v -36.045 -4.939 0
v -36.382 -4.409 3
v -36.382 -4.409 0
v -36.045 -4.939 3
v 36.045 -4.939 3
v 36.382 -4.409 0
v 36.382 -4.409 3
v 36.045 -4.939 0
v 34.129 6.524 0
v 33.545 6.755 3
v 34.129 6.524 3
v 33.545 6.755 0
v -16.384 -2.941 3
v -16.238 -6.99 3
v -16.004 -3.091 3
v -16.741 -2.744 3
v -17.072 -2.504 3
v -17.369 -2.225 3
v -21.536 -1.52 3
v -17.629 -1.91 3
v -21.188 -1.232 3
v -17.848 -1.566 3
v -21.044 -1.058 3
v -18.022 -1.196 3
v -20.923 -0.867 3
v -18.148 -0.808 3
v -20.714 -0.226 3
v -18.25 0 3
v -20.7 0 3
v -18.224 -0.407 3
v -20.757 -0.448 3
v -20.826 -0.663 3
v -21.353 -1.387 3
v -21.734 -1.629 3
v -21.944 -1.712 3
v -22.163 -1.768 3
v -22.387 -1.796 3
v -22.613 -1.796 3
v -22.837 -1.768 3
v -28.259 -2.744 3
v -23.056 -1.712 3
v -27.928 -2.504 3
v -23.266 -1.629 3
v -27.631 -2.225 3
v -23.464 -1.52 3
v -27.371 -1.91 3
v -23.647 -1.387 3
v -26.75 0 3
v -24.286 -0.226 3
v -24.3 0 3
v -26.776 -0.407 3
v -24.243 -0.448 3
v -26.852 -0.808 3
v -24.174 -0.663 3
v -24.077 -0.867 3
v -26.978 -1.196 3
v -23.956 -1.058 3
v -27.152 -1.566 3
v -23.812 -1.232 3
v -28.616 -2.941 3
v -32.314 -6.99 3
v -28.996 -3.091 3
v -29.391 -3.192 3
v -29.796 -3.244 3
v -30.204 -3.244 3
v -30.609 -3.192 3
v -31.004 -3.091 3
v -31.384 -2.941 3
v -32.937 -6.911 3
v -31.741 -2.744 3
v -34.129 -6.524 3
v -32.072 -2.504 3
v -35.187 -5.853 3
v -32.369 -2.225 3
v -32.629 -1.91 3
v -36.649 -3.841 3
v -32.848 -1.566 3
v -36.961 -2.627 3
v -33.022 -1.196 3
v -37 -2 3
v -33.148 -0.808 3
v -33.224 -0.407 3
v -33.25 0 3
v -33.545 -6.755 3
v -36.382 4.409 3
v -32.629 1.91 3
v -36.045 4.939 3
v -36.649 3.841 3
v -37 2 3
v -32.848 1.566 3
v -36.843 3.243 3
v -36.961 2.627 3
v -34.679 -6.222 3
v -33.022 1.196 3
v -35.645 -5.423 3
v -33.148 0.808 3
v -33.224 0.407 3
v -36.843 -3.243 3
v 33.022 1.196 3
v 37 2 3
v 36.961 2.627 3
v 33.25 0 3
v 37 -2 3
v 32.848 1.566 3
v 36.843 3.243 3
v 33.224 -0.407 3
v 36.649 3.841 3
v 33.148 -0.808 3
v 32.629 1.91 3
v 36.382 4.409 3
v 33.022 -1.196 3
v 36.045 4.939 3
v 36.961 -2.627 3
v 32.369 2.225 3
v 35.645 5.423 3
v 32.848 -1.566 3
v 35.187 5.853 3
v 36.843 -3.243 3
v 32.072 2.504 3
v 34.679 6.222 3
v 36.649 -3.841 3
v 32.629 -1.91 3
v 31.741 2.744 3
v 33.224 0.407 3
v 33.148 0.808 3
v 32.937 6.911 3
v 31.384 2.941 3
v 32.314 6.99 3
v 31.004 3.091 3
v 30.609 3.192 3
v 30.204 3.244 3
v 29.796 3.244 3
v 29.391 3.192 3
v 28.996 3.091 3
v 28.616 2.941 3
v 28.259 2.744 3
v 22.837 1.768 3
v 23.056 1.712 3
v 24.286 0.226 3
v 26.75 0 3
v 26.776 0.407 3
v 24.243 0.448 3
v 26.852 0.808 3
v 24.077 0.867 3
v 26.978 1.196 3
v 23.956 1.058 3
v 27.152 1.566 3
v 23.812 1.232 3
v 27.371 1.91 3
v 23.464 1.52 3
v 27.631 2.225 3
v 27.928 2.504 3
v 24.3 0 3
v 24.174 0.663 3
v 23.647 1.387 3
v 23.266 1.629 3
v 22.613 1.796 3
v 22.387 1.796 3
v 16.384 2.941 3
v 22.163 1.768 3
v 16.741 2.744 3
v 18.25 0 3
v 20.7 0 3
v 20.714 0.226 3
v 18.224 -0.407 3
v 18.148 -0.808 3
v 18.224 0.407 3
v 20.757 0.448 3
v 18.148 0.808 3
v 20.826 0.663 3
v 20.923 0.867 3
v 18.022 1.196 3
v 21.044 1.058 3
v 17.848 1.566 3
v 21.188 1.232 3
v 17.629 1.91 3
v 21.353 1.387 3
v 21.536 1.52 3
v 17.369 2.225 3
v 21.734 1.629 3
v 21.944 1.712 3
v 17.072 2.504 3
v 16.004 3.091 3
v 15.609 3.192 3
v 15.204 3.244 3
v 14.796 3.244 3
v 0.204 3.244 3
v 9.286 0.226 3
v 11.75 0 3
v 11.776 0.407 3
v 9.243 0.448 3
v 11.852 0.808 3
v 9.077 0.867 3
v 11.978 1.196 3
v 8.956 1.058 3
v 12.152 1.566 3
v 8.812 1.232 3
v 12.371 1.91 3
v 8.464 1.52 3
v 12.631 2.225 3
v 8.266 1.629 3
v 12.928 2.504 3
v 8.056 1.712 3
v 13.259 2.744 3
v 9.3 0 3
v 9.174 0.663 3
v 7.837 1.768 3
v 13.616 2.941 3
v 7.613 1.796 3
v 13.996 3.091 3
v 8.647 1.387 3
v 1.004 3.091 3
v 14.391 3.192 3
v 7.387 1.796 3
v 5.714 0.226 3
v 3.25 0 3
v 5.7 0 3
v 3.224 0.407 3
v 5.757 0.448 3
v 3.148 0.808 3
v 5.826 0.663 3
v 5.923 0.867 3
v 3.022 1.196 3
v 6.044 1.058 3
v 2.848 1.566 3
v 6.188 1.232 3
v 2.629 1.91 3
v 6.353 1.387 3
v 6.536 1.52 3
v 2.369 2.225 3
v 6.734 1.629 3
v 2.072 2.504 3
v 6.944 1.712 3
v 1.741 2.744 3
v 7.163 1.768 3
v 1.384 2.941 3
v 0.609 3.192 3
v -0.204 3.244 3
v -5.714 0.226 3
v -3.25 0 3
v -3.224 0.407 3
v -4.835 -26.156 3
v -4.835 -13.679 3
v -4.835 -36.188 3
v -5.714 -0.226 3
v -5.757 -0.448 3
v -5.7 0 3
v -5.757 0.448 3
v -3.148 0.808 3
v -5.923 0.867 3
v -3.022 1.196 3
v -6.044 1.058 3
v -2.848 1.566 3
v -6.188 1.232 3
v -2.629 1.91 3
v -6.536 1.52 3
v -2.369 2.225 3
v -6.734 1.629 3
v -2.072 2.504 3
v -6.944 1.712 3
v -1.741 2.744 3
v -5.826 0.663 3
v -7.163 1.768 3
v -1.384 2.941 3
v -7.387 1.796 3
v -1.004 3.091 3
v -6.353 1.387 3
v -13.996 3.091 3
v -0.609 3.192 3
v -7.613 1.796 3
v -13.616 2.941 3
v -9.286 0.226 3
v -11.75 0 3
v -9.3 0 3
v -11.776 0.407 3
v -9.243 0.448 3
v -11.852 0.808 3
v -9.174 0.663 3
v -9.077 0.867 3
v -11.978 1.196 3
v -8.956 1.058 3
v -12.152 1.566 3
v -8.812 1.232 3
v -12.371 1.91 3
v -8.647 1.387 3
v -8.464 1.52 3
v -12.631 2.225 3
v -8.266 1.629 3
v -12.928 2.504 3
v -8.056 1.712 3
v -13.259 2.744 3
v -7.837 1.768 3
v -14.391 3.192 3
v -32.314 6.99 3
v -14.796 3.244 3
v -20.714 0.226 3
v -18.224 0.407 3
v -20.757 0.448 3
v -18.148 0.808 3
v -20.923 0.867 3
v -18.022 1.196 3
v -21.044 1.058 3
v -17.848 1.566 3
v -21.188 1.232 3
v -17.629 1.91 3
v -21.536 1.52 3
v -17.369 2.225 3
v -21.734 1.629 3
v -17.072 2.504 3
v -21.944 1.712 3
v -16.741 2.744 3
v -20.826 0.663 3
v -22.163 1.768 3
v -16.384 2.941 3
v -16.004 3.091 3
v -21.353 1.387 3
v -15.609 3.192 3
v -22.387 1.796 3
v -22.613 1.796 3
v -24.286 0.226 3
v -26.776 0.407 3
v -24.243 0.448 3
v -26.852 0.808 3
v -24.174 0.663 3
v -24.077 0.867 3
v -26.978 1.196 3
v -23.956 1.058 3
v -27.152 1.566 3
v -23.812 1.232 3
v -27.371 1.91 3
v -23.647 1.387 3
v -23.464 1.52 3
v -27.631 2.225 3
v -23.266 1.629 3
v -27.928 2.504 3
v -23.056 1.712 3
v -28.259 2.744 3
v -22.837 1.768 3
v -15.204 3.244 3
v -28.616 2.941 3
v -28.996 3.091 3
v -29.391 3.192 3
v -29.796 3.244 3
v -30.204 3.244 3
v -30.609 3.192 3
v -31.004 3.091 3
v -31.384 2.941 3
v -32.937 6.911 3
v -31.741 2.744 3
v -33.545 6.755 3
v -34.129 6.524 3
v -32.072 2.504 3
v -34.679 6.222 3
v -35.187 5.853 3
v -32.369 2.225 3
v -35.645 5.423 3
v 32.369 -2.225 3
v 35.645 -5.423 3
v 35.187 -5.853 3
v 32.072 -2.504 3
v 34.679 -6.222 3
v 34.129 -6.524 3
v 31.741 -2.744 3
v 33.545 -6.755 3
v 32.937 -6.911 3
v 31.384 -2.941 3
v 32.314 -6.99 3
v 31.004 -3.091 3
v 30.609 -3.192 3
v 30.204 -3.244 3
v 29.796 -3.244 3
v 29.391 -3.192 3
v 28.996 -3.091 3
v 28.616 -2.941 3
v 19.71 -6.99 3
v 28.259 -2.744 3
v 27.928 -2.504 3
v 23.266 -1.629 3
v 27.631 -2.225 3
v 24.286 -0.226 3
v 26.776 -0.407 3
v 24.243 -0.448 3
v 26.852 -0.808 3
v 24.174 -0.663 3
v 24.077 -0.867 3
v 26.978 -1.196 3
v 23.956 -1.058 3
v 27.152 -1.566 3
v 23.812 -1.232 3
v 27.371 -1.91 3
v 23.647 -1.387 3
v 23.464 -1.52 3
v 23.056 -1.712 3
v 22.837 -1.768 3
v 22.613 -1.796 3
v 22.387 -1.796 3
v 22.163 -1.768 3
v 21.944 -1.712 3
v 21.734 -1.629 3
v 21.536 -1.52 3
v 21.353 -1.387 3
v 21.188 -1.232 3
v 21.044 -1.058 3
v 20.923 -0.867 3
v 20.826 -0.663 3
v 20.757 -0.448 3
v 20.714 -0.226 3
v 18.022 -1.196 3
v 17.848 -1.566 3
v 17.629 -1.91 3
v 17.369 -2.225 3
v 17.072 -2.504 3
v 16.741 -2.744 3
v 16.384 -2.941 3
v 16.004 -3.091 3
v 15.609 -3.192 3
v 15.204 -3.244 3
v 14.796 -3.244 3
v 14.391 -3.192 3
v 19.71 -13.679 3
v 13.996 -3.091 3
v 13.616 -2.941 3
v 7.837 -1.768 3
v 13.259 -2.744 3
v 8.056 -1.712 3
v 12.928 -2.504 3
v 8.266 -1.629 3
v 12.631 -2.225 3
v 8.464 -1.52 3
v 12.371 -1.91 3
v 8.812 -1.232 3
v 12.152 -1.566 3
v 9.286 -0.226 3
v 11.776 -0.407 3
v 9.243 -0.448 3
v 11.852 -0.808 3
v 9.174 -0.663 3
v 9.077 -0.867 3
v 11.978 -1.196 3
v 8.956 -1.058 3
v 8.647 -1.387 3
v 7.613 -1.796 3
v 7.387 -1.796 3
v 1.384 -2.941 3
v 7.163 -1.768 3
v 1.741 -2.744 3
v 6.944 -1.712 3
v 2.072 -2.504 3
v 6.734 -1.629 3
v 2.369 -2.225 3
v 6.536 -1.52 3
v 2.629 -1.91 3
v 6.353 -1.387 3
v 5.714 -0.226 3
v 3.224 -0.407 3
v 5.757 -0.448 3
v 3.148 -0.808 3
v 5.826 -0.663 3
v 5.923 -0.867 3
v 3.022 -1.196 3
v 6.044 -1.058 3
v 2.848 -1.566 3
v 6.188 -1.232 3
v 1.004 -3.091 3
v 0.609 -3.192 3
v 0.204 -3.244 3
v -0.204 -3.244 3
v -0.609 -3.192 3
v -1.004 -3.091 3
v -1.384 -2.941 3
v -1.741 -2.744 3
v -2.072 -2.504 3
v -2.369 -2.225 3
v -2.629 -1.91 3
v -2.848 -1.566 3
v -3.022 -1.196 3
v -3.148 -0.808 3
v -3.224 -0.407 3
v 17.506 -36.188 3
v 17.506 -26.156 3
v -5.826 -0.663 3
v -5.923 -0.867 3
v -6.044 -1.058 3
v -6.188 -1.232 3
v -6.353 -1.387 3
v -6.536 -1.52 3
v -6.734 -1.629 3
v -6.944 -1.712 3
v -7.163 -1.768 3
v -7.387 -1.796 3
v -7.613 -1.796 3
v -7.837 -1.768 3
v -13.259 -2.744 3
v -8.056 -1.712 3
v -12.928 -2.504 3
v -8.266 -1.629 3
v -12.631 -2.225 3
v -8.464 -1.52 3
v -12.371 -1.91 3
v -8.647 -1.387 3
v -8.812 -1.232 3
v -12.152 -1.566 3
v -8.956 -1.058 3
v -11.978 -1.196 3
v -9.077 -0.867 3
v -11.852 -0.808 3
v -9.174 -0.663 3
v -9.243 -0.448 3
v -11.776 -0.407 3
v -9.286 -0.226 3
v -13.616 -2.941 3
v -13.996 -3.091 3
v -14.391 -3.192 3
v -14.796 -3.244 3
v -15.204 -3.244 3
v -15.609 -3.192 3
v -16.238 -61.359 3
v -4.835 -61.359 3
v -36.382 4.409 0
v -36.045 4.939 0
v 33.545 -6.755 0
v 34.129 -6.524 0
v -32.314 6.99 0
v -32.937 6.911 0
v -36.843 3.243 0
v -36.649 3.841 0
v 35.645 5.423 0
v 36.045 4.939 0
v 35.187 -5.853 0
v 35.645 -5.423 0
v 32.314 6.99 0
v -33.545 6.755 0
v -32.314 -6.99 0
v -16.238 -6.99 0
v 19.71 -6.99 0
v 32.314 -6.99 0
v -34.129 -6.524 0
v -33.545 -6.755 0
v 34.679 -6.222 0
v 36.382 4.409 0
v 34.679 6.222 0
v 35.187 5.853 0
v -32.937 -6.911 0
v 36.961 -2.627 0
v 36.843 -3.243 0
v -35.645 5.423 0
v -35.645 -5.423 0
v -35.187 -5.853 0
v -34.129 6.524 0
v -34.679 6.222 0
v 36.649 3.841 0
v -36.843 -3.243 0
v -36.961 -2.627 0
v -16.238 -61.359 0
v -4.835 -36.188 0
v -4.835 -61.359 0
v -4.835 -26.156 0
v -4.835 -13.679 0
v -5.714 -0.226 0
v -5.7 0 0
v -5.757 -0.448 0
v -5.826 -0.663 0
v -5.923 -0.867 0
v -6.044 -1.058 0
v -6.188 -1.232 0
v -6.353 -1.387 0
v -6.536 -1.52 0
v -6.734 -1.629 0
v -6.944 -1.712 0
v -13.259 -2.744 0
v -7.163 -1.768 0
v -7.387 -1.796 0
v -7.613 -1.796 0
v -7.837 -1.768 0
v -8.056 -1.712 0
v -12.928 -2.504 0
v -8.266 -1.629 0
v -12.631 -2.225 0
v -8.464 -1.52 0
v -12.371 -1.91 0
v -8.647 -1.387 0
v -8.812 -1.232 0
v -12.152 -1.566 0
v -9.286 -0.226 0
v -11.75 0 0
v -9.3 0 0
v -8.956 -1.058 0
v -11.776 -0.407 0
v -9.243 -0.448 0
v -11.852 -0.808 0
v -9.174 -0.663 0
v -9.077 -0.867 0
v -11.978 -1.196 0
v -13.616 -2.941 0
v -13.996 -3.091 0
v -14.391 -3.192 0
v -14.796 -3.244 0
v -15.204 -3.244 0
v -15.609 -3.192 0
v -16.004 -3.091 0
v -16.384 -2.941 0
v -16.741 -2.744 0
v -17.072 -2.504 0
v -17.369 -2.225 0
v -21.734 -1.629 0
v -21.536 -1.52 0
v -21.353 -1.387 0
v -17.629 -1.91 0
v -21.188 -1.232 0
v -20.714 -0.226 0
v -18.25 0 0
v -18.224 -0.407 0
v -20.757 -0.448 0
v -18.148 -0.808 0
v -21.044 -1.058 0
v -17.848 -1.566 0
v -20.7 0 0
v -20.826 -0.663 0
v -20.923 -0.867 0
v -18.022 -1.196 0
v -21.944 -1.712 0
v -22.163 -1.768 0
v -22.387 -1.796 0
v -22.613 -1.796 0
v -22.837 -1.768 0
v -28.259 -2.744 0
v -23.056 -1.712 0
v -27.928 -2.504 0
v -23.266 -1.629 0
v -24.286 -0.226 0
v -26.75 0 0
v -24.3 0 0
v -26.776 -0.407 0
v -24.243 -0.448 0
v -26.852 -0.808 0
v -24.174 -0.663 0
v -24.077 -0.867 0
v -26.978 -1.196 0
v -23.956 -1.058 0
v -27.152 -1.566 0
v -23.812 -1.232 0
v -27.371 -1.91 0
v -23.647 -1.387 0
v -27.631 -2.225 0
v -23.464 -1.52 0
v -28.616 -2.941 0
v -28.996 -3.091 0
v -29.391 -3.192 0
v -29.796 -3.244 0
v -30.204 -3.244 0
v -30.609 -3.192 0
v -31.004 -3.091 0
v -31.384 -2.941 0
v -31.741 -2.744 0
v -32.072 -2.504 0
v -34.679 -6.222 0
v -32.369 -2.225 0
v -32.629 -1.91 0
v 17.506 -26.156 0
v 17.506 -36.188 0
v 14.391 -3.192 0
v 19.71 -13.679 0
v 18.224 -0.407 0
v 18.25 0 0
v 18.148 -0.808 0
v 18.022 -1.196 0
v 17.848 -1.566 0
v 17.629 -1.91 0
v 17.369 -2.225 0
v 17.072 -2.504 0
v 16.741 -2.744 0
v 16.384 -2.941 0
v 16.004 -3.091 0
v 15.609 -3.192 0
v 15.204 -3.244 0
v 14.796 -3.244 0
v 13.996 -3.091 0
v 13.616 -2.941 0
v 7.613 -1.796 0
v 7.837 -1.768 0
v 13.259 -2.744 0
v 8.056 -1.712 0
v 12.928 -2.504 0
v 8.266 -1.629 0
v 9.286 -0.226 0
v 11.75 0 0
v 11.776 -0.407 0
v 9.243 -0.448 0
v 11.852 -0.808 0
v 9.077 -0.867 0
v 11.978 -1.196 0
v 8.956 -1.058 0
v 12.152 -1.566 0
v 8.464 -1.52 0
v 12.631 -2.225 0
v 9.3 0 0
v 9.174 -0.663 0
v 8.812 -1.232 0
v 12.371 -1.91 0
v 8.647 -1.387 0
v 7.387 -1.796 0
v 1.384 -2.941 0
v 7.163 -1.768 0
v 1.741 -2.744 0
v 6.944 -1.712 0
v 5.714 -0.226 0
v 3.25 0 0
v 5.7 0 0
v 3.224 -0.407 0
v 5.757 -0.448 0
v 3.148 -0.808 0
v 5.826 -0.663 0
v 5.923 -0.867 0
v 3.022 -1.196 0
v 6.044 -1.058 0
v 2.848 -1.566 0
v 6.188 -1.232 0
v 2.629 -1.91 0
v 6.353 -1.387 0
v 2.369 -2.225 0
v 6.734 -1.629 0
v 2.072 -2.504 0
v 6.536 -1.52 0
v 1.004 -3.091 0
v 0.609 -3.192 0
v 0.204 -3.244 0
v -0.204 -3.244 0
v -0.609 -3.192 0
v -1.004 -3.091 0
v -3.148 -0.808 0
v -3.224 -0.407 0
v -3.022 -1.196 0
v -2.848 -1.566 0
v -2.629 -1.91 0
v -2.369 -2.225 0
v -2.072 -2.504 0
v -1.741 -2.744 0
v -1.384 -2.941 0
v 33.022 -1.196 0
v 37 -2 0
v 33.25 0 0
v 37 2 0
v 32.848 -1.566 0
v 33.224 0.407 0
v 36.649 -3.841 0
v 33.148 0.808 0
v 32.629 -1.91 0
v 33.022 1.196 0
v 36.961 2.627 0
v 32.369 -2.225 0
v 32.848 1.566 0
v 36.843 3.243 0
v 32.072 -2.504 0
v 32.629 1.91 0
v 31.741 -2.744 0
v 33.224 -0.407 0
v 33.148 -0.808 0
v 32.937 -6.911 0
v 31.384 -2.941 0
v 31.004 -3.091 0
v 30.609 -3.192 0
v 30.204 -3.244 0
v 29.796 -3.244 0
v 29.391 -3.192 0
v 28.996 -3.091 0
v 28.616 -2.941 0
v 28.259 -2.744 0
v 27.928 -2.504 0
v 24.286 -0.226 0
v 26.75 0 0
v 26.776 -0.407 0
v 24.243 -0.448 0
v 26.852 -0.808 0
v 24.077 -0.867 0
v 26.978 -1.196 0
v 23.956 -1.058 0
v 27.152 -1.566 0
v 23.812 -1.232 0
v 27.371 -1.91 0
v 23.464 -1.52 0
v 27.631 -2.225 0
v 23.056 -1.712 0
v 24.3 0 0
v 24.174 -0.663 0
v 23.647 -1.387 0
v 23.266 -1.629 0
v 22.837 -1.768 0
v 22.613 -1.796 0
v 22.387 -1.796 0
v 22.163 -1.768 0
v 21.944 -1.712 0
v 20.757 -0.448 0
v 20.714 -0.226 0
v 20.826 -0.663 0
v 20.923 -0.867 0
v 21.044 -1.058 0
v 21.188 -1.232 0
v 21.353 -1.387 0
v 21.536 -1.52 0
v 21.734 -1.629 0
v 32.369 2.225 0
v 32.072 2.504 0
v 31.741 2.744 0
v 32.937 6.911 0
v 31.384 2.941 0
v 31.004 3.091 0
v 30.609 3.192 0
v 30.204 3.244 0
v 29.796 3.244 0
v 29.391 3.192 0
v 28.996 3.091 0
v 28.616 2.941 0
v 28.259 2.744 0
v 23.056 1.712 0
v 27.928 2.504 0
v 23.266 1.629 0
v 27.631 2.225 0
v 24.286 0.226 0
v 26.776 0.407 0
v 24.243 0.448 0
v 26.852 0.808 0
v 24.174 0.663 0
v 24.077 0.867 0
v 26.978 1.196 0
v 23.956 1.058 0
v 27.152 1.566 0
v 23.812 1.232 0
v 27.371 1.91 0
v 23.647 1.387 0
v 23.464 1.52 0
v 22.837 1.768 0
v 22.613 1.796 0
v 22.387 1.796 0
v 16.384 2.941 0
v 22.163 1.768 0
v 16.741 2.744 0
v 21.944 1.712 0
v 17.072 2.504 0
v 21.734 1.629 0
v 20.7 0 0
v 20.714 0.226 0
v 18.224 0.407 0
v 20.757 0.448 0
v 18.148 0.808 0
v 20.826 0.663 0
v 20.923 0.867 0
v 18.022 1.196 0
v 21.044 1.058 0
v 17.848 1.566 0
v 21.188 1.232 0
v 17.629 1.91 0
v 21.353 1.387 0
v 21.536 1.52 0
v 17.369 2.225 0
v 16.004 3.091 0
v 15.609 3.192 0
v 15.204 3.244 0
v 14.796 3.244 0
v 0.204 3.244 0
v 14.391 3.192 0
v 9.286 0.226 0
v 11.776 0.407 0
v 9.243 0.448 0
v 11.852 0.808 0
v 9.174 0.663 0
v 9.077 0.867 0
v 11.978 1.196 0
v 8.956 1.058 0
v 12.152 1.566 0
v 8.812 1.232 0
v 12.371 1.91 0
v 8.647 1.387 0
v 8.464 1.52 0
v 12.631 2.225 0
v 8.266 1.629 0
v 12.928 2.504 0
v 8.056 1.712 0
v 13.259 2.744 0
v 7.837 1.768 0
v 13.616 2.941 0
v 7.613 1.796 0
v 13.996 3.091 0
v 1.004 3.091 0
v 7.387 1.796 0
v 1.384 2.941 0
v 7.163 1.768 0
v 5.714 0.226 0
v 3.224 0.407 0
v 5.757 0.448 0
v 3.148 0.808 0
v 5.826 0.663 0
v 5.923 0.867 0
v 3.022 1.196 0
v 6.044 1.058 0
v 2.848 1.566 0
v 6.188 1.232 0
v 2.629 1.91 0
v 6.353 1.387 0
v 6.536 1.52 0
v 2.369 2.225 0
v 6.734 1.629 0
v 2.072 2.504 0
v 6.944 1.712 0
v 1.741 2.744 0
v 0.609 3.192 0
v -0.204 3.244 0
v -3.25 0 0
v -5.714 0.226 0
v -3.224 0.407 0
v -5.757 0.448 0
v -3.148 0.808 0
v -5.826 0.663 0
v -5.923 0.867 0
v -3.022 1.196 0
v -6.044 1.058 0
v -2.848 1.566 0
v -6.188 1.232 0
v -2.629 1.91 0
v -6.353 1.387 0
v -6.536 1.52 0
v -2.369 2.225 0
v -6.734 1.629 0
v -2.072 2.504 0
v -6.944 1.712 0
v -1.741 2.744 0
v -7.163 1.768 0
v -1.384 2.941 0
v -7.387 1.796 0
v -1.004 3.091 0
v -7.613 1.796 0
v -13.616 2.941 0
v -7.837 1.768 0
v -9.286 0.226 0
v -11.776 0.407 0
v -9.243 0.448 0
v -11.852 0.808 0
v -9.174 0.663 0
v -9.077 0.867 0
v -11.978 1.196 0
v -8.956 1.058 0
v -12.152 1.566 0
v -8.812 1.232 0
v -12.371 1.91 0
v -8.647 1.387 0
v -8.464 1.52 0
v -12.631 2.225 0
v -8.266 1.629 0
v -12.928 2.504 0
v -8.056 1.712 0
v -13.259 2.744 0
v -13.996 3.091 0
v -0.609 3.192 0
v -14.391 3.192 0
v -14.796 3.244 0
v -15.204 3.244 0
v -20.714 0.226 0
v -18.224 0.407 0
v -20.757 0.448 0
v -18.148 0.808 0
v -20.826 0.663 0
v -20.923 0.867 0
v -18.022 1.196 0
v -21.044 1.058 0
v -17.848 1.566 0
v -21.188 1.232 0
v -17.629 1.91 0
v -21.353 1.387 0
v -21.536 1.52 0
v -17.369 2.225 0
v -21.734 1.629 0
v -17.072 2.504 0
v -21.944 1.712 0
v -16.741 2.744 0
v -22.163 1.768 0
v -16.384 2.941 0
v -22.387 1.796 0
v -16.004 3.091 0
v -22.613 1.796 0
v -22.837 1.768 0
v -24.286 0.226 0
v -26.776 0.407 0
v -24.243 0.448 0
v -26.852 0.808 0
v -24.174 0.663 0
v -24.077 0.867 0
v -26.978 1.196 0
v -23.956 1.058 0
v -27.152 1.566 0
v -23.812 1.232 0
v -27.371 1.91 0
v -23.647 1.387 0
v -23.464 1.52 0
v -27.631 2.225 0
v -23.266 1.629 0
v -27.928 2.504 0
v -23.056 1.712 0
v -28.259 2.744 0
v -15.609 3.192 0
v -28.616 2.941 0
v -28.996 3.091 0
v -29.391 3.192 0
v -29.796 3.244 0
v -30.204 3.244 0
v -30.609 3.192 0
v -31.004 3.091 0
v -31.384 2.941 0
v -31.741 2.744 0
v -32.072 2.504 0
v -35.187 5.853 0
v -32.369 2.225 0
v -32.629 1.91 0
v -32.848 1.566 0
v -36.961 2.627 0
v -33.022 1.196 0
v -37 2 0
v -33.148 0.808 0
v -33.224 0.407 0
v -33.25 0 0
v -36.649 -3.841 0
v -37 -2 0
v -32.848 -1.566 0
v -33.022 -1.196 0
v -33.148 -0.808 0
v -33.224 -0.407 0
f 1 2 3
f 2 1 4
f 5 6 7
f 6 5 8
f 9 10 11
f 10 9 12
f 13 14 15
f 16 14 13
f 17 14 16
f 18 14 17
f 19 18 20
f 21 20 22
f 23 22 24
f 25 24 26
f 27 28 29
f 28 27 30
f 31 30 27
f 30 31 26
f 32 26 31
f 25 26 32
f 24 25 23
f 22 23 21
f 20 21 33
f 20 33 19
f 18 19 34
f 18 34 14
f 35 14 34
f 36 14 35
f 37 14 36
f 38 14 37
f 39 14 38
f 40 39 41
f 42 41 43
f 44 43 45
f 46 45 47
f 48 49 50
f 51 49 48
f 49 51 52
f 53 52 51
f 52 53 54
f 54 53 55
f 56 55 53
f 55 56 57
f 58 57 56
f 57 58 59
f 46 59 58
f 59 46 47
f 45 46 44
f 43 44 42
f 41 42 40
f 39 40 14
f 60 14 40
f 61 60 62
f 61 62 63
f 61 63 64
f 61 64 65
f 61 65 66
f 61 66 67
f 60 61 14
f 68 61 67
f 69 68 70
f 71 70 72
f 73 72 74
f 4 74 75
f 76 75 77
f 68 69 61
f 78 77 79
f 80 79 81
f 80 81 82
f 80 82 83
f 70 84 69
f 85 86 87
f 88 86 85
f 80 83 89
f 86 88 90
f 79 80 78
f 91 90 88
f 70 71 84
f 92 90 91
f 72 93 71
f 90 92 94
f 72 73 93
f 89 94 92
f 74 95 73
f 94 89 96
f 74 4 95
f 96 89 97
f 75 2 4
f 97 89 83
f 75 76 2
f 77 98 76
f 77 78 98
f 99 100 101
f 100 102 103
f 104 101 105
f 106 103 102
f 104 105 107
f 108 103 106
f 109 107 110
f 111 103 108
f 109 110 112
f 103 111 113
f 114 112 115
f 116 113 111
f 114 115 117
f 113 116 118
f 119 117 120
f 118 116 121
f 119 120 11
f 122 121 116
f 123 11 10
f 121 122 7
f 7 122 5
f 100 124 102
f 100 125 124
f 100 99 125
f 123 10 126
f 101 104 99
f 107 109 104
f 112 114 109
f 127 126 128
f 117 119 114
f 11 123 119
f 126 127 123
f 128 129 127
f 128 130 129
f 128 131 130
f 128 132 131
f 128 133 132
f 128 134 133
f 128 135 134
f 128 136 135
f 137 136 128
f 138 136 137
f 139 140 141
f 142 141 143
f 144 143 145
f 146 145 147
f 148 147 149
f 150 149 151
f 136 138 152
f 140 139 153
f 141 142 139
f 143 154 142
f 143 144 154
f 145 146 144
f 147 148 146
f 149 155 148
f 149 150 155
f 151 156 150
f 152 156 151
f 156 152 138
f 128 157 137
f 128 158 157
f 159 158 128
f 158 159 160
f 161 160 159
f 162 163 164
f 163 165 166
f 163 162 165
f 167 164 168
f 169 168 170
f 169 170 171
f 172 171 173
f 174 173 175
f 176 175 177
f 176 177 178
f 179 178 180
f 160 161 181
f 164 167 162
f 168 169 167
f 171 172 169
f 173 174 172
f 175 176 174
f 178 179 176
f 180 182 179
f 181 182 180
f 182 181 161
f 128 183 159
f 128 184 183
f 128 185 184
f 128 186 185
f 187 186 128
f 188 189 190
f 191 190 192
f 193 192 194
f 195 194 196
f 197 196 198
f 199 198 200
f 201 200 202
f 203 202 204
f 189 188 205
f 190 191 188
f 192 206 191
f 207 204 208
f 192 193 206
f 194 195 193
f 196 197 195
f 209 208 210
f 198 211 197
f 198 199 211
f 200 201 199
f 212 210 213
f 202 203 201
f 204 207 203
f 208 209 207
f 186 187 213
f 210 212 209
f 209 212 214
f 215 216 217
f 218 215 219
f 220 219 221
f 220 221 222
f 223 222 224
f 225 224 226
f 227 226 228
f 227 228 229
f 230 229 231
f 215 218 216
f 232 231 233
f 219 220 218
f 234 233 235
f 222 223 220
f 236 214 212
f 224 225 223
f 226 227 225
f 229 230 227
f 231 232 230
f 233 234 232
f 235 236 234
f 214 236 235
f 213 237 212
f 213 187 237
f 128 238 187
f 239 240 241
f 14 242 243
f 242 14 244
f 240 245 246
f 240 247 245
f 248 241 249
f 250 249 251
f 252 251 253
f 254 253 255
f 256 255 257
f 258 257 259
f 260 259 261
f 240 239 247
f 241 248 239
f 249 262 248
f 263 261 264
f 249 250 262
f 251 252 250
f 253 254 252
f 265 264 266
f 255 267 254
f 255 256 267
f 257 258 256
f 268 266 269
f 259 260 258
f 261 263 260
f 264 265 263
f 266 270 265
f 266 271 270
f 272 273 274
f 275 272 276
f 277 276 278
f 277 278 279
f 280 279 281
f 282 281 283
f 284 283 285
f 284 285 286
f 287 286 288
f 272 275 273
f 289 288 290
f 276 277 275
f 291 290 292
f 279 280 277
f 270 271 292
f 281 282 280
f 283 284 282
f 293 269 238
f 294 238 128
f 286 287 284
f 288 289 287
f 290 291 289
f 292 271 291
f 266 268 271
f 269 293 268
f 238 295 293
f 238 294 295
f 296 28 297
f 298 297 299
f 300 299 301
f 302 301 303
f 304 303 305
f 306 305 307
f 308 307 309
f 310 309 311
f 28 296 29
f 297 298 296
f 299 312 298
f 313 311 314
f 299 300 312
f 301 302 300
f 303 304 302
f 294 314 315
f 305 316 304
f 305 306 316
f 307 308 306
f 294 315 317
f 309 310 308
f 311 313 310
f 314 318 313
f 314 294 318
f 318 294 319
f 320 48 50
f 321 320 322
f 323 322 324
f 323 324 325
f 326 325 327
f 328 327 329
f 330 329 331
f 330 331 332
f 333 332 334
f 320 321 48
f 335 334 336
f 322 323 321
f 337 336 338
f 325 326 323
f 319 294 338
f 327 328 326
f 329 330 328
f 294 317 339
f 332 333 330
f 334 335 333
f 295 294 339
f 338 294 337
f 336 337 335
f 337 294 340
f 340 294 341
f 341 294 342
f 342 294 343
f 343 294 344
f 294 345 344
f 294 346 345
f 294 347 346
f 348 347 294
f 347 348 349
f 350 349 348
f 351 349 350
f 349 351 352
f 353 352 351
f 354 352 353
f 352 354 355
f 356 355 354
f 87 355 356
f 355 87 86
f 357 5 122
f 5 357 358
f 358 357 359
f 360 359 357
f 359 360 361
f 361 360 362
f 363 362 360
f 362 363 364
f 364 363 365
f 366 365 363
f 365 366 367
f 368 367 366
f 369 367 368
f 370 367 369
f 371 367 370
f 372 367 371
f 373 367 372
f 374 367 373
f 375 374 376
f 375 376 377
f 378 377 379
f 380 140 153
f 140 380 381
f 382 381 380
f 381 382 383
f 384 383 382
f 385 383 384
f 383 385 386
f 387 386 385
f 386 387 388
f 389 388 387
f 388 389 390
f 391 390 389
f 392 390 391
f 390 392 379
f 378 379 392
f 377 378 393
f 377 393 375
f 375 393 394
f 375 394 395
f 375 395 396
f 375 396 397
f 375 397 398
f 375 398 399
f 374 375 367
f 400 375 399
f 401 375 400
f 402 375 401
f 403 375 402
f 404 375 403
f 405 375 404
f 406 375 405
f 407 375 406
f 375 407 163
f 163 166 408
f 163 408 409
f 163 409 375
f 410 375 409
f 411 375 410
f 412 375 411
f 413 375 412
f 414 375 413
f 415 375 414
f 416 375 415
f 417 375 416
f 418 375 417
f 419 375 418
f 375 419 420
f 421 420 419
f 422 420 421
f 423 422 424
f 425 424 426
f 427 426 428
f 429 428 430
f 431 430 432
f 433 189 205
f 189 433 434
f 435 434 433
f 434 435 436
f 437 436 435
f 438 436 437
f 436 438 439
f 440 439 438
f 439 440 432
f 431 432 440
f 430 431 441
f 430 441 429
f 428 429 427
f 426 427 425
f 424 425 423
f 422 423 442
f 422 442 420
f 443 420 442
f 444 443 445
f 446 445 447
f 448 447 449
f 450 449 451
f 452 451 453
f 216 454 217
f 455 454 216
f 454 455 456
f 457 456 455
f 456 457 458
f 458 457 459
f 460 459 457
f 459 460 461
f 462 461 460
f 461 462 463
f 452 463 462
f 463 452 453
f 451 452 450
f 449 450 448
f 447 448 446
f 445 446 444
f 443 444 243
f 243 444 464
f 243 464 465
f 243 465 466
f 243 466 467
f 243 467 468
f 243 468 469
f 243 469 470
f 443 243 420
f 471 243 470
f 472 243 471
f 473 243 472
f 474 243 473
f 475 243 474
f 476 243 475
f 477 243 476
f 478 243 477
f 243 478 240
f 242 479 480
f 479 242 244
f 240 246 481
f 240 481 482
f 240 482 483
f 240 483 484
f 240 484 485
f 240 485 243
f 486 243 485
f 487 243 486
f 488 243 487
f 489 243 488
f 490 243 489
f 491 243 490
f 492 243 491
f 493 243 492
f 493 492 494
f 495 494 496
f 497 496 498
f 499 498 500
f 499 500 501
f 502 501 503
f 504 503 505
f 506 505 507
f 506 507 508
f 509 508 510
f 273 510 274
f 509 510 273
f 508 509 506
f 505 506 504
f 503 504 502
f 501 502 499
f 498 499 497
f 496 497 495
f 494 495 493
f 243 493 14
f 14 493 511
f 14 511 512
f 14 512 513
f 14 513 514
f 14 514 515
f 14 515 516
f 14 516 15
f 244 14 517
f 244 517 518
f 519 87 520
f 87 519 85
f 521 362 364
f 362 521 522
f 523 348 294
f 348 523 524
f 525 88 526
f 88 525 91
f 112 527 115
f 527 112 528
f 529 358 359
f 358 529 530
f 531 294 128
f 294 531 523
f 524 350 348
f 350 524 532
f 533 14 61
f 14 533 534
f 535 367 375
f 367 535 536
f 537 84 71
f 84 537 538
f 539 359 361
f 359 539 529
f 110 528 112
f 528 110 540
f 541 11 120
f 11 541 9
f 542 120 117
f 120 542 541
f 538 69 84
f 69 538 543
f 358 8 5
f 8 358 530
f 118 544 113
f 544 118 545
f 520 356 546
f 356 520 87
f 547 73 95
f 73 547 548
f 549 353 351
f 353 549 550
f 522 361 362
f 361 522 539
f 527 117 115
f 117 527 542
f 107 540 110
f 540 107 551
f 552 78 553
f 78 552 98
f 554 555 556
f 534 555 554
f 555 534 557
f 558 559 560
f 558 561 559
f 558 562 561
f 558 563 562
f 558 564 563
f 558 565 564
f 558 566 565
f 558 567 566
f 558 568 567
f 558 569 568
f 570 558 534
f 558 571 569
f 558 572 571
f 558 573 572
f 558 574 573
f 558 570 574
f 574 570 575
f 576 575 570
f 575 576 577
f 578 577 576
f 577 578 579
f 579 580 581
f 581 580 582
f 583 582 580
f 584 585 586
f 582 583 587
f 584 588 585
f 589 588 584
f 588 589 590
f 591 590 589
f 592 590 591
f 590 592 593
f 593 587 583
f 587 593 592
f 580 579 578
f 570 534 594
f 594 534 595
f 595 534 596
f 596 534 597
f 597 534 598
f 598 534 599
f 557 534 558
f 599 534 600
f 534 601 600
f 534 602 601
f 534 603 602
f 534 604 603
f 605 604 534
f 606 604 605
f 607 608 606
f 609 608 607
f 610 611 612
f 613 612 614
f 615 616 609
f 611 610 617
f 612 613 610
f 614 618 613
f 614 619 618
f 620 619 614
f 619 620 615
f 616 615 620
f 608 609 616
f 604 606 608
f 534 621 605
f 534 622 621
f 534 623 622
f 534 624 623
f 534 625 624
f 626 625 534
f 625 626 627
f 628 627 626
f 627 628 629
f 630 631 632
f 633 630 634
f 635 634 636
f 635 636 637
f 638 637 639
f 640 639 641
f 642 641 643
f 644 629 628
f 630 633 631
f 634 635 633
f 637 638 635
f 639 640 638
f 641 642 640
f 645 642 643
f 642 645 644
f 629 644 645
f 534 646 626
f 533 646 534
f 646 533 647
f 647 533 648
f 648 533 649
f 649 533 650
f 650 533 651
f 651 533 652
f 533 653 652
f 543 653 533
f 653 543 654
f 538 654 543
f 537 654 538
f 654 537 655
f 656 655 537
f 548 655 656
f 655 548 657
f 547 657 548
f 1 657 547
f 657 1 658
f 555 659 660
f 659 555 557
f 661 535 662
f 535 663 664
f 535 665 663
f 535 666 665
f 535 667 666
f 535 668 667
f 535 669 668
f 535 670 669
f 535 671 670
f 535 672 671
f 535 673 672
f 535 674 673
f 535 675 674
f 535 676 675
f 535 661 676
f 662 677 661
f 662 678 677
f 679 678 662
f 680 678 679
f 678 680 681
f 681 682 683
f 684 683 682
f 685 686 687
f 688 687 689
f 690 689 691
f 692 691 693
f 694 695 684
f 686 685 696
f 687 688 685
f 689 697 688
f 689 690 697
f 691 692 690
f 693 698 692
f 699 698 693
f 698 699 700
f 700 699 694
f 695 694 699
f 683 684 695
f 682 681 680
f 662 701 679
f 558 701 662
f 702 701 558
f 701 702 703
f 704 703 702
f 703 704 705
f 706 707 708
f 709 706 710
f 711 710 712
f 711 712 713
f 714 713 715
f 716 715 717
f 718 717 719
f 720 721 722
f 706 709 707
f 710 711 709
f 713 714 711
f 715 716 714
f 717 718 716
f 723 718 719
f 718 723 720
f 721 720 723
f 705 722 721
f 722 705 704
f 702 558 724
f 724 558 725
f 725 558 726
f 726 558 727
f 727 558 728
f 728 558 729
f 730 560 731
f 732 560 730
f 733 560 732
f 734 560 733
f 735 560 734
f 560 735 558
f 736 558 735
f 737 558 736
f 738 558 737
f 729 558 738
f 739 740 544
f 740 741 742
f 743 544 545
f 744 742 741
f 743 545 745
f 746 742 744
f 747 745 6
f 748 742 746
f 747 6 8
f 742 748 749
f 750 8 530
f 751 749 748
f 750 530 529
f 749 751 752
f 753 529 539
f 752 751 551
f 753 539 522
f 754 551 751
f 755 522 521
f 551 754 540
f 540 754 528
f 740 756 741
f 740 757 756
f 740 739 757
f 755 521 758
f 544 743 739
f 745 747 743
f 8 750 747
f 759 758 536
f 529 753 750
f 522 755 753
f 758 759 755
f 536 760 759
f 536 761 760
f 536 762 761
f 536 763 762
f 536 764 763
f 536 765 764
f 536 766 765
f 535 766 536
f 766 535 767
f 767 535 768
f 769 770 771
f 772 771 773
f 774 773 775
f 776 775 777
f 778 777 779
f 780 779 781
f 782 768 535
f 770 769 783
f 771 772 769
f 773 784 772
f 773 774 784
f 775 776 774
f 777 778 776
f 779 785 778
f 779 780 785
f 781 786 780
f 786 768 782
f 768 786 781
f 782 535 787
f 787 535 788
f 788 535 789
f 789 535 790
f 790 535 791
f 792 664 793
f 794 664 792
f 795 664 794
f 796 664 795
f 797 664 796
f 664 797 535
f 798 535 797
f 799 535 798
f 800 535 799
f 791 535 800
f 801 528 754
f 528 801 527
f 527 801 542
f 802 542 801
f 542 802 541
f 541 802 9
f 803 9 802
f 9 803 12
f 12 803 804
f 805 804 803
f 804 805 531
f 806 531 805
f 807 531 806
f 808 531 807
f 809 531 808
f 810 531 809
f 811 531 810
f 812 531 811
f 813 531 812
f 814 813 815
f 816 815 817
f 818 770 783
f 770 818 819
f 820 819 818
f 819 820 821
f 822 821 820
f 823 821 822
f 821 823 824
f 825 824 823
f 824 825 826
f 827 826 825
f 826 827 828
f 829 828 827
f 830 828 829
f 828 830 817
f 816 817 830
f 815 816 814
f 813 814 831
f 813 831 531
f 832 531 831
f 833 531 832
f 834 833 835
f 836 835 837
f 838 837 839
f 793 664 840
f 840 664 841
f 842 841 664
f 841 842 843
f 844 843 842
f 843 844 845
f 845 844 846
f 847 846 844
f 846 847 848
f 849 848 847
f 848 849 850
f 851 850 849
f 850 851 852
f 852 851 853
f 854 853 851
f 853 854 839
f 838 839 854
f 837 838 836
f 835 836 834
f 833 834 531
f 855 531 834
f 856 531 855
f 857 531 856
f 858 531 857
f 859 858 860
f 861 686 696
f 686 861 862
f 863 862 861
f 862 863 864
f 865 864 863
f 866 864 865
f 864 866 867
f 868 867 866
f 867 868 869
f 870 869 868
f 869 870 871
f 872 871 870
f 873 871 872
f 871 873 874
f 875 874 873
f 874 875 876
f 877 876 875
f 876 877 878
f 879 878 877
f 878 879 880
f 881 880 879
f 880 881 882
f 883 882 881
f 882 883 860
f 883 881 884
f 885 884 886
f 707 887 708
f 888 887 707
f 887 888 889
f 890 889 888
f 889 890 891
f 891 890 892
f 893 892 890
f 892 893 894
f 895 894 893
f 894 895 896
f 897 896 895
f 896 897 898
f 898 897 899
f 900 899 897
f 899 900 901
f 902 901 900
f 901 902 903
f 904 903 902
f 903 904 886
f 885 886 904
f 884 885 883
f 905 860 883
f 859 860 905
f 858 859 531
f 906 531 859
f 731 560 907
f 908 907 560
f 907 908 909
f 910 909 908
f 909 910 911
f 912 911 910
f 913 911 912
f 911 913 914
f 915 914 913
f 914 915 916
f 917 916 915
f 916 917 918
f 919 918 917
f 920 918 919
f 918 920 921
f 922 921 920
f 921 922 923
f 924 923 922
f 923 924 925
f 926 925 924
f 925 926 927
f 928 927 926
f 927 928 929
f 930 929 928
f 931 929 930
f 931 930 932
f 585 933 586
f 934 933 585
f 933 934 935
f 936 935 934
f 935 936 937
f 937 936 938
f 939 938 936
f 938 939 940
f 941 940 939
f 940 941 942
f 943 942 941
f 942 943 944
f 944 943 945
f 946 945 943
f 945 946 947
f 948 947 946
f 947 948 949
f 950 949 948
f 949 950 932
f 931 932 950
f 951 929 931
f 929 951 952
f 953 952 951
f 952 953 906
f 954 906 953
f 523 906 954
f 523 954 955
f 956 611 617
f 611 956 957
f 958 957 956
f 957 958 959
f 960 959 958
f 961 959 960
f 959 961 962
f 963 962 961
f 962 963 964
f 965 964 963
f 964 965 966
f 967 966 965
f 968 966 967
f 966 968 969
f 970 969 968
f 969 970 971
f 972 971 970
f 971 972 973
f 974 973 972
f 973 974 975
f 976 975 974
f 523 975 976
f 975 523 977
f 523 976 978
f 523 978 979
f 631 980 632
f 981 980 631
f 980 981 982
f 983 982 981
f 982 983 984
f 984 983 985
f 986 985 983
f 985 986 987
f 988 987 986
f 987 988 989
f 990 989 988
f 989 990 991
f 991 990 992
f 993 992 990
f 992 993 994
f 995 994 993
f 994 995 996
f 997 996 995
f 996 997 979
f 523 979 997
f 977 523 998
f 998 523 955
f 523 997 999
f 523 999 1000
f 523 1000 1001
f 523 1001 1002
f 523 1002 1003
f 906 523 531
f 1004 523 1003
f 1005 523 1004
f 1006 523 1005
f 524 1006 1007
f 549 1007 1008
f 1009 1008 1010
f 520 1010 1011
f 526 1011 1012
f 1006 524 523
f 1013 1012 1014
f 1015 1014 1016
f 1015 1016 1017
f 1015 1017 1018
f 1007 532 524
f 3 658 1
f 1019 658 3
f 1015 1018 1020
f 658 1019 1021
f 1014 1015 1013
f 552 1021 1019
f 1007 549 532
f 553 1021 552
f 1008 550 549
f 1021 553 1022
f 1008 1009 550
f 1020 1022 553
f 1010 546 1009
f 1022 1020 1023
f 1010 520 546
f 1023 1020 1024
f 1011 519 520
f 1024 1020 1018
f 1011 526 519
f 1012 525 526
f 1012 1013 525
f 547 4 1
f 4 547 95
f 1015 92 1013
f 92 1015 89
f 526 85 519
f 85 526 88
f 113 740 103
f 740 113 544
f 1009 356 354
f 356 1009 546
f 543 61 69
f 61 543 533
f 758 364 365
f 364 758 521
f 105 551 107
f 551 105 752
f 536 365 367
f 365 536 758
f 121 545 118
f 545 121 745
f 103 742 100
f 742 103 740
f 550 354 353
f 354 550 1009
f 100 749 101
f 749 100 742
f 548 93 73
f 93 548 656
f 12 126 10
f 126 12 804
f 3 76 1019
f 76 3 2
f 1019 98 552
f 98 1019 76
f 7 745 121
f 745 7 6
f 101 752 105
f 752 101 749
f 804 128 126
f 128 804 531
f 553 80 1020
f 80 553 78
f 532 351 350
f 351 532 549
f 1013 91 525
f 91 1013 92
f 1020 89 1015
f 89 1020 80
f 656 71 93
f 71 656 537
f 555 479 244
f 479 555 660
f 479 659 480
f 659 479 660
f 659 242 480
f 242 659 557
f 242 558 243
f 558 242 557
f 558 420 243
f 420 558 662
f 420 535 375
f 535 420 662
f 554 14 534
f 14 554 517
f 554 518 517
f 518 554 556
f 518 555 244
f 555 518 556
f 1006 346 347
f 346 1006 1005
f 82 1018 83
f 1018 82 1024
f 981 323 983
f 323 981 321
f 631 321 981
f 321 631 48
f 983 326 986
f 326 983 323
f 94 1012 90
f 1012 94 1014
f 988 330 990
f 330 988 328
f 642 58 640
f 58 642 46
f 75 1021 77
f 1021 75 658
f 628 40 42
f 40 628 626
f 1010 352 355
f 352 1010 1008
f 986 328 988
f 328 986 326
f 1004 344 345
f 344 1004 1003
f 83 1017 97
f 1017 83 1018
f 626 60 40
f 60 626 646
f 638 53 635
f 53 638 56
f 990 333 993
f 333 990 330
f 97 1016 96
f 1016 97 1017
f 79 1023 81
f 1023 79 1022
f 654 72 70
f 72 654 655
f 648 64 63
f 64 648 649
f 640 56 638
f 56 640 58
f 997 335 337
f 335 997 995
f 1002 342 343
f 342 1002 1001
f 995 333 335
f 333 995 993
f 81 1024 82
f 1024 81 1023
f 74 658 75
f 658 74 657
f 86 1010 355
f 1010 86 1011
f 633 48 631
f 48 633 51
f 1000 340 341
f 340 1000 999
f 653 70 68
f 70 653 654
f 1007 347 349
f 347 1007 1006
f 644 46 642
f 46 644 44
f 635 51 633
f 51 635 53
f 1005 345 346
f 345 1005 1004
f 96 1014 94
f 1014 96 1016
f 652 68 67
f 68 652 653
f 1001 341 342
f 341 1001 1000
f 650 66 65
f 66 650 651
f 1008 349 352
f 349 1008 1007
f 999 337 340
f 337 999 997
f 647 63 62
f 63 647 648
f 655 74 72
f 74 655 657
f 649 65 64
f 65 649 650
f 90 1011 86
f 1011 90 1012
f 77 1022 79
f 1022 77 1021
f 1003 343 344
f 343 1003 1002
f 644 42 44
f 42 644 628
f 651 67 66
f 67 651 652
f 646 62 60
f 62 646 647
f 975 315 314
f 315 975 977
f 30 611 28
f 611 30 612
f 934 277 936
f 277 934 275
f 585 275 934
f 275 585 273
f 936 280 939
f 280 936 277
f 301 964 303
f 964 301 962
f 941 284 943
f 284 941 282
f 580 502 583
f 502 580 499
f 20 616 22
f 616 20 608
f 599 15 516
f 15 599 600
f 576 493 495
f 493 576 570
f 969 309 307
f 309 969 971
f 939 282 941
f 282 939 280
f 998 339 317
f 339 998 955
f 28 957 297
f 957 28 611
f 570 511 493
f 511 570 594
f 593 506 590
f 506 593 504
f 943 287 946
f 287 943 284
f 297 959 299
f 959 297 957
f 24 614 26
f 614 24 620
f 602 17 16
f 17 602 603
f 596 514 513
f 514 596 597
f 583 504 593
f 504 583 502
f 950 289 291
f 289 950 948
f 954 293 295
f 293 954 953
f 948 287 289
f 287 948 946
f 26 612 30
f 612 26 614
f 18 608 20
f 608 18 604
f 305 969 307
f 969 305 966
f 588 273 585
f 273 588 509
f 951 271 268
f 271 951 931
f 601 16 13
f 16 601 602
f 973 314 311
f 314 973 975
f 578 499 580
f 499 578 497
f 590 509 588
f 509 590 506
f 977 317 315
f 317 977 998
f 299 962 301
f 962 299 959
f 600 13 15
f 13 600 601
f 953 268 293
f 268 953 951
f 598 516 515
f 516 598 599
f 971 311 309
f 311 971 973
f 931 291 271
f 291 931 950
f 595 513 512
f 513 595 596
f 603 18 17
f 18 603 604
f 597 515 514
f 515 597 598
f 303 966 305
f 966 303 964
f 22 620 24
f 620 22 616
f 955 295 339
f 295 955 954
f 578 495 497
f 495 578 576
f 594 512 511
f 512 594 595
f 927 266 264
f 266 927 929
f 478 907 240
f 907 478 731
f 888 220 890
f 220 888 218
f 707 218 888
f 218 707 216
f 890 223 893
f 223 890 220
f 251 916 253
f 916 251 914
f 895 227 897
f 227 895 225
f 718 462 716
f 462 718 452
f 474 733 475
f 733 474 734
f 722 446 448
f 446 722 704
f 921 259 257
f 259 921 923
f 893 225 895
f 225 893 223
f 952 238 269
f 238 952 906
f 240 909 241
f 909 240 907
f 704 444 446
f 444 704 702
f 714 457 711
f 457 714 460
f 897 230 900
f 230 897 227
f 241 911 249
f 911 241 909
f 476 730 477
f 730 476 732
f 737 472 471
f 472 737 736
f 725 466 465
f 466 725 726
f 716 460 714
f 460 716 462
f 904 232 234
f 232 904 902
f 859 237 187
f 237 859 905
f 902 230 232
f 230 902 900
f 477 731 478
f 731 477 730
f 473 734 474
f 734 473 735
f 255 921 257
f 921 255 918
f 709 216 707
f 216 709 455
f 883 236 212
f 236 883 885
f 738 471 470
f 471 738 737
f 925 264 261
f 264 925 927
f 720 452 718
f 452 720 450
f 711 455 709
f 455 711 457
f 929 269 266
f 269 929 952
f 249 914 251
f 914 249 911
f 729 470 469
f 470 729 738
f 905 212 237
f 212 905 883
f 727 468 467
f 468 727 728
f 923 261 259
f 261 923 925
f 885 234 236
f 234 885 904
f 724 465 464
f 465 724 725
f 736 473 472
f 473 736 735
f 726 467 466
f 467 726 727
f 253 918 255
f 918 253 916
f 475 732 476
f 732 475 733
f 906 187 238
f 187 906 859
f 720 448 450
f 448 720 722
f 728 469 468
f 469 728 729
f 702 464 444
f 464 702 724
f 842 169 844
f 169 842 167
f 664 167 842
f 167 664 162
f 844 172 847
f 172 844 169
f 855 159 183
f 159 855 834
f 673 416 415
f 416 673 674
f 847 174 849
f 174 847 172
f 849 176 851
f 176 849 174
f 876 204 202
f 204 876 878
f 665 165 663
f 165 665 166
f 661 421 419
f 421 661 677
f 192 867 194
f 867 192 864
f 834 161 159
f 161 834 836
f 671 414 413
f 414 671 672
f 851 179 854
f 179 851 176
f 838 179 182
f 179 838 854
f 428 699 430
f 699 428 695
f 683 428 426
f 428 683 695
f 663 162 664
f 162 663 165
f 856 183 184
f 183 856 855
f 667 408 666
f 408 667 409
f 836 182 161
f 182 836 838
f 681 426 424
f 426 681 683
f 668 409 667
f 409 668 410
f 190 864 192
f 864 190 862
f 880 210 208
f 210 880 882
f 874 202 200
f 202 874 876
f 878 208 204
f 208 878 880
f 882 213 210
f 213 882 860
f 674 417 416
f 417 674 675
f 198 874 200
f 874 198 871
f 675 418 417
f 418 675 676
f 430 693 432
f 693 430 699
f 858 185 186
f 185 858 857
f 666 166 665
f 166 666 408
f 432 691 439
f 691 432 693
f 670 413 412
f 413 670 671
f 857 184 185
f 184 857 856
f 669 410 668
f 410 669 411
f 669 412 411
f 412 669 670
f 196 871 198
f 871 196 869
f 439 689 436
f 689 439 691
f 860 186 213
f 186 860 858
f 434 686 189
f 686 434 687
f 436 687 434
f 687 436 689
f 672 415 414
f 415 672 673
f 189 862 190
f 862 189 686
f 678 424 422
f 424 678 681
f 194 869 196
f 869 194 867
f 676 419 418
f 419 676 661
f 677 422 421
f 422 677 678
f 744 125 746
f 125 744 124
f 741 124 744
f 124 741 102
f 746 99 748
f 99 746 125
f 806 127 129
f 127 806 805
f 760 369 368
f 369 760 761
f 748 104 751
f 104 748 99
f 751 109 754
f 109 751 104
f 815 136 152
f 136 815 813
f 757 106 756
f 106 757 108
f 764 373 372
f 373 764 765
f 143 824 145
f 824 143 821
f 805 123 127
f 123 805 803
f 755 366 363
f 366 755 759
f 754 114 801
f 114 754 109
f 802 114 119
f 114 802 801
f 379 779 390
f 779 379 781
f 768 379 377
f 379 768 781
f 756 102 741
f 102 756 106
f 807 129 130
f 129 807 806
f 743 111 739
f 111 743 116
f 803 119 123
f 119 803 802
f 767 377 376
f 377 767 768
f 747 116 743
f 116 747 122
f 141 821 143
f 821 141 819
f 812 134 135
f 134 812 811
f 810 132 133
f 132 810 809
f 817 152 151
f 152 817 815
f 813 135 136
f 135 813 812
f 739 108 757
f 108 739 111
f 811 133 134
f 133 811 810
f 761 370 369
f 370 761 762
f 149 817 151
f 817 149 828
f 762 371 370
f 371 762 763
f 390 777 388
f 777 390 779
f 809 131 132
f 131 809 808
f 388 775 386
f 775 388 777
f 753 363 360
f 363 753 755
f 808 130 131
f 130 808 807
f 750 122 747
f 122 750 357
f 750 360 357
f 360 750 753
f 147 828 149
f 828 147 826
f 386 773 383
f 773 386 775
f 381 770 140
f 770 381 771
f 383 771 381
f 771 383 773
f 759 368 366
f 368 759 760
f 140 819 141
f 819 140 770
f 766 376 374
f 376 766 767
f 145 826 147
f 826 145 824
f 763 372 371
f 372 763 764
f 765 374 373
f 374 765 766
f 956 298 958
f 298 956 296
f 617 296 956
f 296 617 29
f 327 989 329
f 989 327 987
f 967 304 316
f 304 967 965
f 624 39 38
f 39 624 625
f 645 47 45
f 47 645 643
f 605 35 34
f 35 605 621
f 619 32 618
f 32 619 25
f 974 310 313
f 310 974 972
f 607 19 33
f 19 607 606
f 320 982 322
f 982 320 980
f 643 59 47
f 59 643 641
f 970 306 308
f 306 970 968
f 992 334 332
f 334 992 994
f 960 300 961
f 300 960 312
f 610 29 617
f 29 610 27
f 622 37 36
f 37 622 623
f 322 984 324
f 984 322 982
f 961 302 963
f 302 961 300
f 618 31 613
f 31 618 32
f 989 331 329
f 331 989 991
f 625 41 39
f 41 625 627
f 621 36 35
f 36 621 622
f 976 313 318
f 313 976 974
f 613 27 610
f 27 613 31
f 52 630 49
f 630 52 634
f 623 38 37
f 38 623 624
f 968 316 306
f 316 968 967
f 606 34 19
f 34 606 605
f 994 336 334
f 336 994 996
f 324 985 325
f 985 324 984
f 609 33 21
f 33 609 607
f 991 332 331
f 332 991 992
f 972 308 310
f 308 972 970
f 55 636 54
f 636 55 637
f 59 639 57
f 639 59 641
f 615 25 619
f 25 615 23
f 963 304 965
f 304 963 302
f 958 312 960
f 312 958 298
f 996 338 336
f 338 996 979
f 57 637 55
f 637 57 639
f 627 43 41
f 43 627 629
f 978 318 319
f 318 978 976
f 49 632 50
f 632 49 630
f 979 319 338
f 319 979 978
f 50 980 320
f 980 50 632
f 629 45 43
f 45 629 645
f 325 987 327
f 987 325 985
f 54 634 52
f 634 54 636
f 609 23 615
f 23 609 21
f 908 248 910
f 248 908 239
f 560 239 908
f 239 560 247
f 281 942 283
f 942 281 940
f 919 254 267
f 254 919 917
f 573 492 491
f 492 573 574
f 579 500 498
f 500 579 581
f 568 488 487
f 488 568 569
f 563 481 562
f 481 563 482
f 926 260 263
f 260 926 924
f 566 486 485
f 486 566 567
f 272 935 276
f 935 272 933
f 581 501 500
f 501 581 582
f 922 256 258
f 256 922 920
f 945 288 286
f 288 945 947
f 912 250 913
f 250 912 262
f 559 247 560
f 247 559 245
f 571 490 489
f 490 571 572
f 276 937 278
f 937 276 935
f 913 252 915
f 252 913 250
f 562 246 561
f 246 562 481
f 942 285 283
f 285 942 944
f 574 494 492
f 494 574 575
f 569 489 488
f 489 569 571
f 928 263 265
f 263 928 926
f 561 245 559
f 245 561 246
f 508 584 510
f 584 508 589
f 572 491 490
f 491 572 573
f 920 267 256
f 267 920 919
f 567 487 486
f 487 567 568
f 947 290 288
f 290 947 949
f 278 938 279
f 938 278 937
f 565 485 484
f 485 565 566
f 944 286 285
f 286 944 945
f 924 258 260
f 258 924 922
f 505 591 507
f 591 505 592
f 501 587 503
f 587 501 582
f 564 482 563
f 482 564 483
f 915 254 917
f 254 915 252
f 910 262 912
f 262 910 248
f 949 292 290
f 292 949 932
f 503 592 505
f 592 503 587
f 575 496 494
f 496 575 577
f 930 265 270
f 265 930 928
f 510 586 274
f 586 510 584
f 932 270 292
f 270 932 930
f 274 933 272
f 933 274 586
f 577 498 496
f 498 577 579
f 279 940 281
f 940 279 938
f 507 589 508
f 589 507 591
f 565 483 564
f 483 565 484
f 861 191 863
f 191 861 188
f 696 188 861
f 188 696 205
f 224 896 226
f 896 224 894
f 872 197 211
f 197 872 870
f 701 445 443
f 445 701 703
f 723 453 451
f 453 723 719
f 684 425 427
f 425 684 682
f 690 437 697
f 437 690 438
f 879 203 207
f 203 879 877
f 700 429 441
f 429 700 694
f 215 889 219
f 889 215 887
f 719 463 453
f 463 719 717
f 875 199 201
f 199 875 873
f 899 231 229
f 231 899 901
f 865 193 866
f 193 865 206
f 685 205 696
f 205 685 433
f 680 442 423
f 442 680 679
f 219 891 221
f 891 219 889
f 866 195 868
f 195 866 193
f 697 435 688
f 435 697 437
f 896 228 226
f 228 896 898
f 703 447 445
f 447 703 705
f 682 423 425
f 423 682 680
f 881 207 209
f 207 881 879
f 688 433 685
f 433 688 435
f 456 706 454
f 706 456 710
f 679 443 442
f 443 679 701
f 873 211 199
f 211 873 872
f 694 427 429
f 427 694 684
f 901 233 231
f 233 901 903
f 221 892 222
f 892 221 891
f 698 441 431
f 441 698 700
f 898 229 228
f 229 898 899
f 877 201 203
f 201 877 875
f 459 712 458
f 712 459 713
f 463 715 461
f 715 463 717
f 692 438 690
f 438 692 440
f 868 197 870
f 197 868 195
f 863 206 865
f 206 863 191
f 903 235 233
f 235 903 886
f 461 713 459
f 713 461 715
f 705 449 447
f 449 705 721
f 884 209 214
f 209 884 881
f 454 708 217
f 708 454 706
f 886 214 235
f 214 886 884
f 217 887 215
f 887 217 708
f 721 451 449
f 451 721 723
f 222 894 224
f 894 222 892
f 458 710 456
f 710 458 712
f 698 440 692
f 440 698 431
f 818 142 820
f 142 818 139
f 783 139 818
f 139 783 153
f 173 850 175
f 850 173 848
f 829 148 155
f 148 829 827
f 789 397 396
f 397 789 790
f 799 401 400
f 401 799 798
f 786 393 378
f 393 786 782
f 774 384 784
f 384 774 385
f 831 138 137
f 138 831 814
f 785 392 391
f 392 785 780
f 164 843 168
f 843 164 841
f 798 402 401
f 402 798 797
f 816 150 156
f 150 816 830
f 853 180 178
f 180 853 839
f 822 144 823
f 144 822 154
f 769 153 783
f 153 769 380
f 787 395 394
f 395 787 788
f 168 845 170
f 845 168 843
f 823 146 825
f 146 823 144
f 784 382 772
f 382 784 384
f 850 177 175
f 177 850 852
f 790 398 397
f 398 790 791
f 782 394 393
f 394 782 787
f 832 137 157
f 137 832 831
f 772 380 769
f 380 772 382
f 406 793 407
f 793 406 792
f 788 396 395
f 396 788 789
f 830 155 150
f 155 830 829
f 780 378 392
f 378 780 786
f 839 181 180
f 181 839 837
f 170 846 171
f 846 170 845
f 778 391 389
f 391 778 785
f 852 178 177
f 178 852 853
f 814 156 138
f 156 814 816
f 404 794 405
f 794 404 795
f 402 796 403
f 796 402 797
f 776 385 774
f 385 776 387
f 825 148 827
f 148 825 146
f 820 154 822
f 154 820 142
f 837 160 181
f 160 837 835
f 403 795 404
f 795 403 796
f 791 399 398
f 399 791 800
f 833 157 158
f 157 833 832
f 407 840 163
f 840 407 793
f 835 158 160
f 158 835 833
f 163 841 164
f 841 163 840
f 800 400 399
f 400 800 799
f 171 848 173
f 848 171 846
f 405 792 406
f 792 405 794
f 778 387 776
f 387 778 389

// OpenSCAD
$fn = 50;


difference() {
	union() {
		hull() {
			translate(v = [-32.0000000000, 2.0000000000, 0]) {
				cylinder(h = 3, r = 5);
			}
			translate(v = [32.0000000000, 2.0000000000, 0]) {
				cylinder(h = 3, r = 5);
			}
			translate(v = [-32.0000000000, -2.0000000000, 0]) {
				cylinder(h = 3, r = 5);
			}
			translate(v = [32.0000000000, -2.0000000000, 0]) {
				cylinder(h = 3, r = 5);
			}
		}
		translate(v = [0, -5, 0]) {
			linear_extrude(height = 3) {
				text(font = "DejaVu Sans Mono:style=Bold", halign = "center", size = 57.0000000000, text = "F", valign = "top");
			}
		}
	}
	union() {
		translate(v = [-30.0000000000, 0.0000000000, 0]) {
			translate(v = [0, 0, -100]) {
				cylinder(h = 200, r = 3.2500000000);
			}
		}
		translate(v = [-15.0000000000, 0.0000000000, 0]) {
			translate(v = [0, 0, -100]) {
				cylinder(h = 200, r = 3.2500000000);
			}
		}
		translate(v = [0, 0, -100]) {
			cylinder(h = 200, r = 3.2500000000);
		}
		translate(v = [15.0000000000, 0.0000000000, 0]) {
			translate(v = [0, 0, -100]) {
				cylinder(h = 200, r = 3.2500000000);
			}
		}
		translate(v = [30.0000000000, 0.0000000000, 0]) {
			translate(v = [0, 0, -100]) {
				cylinder(h = 200, r = 3.2500000000);
			}
		}
		translate(v = [-30.0000000000, 0.0000000000, 0]) {
			translate(v = [0, 0, -100]) {
				cylinder(h = 200, r = 1.8000000000);
			}
		}
		translate(v = [-22.5000000000, 0.0000000000, 0]) {
			translate(v = [0, 0, -100]) {
				cylinder(h = 200, r = 1.8000000000);
			}
		}
		translate(v = [-15.0000000000, 0.0000000000, 0]) {
			translate(v = [0, 0, -100]) {
				cylinder(h = 200, r = 1.8000000000);
			}
		}
		translate(v = [-7.5000000000, 0.0000000000, 0]) {
			translate(v = [0, 0, -100]) {
				cylinder(h = 200, r = 1.8000000000);
			}
		}
		translate(v = [0, 0, -100]) {
			cylinder(h = 200, r = 1.8000000000);
		}
		translate(v = [7.5000000000, 0.0000000000, 0]) {
			translate(v = [0, 0, -100]) {
				cylinder(h = 200, r = 1.8000000000);
			}
		}
		translate(v = [15.0000000000, 0.0000000000, 0]) {
			translate(v = [0, 0, -100]) {
				cylinder(h = 200, r = 1.8000000000);
			}
		}
		translate(v = [22.5000000000, 0.0000000000, 0]) {
			translate(v = [0, 0, -100]) {
				cylinder(h = 200, r = 1.8000000000);
			}
		}
		translate(v = [30.0000000000, 0.0000000000, 0]) {
			translate(v = [0, 0, -100]) {
				cylinder(h = 200, r = 1.8000000000);
			}
		}
	}
}
